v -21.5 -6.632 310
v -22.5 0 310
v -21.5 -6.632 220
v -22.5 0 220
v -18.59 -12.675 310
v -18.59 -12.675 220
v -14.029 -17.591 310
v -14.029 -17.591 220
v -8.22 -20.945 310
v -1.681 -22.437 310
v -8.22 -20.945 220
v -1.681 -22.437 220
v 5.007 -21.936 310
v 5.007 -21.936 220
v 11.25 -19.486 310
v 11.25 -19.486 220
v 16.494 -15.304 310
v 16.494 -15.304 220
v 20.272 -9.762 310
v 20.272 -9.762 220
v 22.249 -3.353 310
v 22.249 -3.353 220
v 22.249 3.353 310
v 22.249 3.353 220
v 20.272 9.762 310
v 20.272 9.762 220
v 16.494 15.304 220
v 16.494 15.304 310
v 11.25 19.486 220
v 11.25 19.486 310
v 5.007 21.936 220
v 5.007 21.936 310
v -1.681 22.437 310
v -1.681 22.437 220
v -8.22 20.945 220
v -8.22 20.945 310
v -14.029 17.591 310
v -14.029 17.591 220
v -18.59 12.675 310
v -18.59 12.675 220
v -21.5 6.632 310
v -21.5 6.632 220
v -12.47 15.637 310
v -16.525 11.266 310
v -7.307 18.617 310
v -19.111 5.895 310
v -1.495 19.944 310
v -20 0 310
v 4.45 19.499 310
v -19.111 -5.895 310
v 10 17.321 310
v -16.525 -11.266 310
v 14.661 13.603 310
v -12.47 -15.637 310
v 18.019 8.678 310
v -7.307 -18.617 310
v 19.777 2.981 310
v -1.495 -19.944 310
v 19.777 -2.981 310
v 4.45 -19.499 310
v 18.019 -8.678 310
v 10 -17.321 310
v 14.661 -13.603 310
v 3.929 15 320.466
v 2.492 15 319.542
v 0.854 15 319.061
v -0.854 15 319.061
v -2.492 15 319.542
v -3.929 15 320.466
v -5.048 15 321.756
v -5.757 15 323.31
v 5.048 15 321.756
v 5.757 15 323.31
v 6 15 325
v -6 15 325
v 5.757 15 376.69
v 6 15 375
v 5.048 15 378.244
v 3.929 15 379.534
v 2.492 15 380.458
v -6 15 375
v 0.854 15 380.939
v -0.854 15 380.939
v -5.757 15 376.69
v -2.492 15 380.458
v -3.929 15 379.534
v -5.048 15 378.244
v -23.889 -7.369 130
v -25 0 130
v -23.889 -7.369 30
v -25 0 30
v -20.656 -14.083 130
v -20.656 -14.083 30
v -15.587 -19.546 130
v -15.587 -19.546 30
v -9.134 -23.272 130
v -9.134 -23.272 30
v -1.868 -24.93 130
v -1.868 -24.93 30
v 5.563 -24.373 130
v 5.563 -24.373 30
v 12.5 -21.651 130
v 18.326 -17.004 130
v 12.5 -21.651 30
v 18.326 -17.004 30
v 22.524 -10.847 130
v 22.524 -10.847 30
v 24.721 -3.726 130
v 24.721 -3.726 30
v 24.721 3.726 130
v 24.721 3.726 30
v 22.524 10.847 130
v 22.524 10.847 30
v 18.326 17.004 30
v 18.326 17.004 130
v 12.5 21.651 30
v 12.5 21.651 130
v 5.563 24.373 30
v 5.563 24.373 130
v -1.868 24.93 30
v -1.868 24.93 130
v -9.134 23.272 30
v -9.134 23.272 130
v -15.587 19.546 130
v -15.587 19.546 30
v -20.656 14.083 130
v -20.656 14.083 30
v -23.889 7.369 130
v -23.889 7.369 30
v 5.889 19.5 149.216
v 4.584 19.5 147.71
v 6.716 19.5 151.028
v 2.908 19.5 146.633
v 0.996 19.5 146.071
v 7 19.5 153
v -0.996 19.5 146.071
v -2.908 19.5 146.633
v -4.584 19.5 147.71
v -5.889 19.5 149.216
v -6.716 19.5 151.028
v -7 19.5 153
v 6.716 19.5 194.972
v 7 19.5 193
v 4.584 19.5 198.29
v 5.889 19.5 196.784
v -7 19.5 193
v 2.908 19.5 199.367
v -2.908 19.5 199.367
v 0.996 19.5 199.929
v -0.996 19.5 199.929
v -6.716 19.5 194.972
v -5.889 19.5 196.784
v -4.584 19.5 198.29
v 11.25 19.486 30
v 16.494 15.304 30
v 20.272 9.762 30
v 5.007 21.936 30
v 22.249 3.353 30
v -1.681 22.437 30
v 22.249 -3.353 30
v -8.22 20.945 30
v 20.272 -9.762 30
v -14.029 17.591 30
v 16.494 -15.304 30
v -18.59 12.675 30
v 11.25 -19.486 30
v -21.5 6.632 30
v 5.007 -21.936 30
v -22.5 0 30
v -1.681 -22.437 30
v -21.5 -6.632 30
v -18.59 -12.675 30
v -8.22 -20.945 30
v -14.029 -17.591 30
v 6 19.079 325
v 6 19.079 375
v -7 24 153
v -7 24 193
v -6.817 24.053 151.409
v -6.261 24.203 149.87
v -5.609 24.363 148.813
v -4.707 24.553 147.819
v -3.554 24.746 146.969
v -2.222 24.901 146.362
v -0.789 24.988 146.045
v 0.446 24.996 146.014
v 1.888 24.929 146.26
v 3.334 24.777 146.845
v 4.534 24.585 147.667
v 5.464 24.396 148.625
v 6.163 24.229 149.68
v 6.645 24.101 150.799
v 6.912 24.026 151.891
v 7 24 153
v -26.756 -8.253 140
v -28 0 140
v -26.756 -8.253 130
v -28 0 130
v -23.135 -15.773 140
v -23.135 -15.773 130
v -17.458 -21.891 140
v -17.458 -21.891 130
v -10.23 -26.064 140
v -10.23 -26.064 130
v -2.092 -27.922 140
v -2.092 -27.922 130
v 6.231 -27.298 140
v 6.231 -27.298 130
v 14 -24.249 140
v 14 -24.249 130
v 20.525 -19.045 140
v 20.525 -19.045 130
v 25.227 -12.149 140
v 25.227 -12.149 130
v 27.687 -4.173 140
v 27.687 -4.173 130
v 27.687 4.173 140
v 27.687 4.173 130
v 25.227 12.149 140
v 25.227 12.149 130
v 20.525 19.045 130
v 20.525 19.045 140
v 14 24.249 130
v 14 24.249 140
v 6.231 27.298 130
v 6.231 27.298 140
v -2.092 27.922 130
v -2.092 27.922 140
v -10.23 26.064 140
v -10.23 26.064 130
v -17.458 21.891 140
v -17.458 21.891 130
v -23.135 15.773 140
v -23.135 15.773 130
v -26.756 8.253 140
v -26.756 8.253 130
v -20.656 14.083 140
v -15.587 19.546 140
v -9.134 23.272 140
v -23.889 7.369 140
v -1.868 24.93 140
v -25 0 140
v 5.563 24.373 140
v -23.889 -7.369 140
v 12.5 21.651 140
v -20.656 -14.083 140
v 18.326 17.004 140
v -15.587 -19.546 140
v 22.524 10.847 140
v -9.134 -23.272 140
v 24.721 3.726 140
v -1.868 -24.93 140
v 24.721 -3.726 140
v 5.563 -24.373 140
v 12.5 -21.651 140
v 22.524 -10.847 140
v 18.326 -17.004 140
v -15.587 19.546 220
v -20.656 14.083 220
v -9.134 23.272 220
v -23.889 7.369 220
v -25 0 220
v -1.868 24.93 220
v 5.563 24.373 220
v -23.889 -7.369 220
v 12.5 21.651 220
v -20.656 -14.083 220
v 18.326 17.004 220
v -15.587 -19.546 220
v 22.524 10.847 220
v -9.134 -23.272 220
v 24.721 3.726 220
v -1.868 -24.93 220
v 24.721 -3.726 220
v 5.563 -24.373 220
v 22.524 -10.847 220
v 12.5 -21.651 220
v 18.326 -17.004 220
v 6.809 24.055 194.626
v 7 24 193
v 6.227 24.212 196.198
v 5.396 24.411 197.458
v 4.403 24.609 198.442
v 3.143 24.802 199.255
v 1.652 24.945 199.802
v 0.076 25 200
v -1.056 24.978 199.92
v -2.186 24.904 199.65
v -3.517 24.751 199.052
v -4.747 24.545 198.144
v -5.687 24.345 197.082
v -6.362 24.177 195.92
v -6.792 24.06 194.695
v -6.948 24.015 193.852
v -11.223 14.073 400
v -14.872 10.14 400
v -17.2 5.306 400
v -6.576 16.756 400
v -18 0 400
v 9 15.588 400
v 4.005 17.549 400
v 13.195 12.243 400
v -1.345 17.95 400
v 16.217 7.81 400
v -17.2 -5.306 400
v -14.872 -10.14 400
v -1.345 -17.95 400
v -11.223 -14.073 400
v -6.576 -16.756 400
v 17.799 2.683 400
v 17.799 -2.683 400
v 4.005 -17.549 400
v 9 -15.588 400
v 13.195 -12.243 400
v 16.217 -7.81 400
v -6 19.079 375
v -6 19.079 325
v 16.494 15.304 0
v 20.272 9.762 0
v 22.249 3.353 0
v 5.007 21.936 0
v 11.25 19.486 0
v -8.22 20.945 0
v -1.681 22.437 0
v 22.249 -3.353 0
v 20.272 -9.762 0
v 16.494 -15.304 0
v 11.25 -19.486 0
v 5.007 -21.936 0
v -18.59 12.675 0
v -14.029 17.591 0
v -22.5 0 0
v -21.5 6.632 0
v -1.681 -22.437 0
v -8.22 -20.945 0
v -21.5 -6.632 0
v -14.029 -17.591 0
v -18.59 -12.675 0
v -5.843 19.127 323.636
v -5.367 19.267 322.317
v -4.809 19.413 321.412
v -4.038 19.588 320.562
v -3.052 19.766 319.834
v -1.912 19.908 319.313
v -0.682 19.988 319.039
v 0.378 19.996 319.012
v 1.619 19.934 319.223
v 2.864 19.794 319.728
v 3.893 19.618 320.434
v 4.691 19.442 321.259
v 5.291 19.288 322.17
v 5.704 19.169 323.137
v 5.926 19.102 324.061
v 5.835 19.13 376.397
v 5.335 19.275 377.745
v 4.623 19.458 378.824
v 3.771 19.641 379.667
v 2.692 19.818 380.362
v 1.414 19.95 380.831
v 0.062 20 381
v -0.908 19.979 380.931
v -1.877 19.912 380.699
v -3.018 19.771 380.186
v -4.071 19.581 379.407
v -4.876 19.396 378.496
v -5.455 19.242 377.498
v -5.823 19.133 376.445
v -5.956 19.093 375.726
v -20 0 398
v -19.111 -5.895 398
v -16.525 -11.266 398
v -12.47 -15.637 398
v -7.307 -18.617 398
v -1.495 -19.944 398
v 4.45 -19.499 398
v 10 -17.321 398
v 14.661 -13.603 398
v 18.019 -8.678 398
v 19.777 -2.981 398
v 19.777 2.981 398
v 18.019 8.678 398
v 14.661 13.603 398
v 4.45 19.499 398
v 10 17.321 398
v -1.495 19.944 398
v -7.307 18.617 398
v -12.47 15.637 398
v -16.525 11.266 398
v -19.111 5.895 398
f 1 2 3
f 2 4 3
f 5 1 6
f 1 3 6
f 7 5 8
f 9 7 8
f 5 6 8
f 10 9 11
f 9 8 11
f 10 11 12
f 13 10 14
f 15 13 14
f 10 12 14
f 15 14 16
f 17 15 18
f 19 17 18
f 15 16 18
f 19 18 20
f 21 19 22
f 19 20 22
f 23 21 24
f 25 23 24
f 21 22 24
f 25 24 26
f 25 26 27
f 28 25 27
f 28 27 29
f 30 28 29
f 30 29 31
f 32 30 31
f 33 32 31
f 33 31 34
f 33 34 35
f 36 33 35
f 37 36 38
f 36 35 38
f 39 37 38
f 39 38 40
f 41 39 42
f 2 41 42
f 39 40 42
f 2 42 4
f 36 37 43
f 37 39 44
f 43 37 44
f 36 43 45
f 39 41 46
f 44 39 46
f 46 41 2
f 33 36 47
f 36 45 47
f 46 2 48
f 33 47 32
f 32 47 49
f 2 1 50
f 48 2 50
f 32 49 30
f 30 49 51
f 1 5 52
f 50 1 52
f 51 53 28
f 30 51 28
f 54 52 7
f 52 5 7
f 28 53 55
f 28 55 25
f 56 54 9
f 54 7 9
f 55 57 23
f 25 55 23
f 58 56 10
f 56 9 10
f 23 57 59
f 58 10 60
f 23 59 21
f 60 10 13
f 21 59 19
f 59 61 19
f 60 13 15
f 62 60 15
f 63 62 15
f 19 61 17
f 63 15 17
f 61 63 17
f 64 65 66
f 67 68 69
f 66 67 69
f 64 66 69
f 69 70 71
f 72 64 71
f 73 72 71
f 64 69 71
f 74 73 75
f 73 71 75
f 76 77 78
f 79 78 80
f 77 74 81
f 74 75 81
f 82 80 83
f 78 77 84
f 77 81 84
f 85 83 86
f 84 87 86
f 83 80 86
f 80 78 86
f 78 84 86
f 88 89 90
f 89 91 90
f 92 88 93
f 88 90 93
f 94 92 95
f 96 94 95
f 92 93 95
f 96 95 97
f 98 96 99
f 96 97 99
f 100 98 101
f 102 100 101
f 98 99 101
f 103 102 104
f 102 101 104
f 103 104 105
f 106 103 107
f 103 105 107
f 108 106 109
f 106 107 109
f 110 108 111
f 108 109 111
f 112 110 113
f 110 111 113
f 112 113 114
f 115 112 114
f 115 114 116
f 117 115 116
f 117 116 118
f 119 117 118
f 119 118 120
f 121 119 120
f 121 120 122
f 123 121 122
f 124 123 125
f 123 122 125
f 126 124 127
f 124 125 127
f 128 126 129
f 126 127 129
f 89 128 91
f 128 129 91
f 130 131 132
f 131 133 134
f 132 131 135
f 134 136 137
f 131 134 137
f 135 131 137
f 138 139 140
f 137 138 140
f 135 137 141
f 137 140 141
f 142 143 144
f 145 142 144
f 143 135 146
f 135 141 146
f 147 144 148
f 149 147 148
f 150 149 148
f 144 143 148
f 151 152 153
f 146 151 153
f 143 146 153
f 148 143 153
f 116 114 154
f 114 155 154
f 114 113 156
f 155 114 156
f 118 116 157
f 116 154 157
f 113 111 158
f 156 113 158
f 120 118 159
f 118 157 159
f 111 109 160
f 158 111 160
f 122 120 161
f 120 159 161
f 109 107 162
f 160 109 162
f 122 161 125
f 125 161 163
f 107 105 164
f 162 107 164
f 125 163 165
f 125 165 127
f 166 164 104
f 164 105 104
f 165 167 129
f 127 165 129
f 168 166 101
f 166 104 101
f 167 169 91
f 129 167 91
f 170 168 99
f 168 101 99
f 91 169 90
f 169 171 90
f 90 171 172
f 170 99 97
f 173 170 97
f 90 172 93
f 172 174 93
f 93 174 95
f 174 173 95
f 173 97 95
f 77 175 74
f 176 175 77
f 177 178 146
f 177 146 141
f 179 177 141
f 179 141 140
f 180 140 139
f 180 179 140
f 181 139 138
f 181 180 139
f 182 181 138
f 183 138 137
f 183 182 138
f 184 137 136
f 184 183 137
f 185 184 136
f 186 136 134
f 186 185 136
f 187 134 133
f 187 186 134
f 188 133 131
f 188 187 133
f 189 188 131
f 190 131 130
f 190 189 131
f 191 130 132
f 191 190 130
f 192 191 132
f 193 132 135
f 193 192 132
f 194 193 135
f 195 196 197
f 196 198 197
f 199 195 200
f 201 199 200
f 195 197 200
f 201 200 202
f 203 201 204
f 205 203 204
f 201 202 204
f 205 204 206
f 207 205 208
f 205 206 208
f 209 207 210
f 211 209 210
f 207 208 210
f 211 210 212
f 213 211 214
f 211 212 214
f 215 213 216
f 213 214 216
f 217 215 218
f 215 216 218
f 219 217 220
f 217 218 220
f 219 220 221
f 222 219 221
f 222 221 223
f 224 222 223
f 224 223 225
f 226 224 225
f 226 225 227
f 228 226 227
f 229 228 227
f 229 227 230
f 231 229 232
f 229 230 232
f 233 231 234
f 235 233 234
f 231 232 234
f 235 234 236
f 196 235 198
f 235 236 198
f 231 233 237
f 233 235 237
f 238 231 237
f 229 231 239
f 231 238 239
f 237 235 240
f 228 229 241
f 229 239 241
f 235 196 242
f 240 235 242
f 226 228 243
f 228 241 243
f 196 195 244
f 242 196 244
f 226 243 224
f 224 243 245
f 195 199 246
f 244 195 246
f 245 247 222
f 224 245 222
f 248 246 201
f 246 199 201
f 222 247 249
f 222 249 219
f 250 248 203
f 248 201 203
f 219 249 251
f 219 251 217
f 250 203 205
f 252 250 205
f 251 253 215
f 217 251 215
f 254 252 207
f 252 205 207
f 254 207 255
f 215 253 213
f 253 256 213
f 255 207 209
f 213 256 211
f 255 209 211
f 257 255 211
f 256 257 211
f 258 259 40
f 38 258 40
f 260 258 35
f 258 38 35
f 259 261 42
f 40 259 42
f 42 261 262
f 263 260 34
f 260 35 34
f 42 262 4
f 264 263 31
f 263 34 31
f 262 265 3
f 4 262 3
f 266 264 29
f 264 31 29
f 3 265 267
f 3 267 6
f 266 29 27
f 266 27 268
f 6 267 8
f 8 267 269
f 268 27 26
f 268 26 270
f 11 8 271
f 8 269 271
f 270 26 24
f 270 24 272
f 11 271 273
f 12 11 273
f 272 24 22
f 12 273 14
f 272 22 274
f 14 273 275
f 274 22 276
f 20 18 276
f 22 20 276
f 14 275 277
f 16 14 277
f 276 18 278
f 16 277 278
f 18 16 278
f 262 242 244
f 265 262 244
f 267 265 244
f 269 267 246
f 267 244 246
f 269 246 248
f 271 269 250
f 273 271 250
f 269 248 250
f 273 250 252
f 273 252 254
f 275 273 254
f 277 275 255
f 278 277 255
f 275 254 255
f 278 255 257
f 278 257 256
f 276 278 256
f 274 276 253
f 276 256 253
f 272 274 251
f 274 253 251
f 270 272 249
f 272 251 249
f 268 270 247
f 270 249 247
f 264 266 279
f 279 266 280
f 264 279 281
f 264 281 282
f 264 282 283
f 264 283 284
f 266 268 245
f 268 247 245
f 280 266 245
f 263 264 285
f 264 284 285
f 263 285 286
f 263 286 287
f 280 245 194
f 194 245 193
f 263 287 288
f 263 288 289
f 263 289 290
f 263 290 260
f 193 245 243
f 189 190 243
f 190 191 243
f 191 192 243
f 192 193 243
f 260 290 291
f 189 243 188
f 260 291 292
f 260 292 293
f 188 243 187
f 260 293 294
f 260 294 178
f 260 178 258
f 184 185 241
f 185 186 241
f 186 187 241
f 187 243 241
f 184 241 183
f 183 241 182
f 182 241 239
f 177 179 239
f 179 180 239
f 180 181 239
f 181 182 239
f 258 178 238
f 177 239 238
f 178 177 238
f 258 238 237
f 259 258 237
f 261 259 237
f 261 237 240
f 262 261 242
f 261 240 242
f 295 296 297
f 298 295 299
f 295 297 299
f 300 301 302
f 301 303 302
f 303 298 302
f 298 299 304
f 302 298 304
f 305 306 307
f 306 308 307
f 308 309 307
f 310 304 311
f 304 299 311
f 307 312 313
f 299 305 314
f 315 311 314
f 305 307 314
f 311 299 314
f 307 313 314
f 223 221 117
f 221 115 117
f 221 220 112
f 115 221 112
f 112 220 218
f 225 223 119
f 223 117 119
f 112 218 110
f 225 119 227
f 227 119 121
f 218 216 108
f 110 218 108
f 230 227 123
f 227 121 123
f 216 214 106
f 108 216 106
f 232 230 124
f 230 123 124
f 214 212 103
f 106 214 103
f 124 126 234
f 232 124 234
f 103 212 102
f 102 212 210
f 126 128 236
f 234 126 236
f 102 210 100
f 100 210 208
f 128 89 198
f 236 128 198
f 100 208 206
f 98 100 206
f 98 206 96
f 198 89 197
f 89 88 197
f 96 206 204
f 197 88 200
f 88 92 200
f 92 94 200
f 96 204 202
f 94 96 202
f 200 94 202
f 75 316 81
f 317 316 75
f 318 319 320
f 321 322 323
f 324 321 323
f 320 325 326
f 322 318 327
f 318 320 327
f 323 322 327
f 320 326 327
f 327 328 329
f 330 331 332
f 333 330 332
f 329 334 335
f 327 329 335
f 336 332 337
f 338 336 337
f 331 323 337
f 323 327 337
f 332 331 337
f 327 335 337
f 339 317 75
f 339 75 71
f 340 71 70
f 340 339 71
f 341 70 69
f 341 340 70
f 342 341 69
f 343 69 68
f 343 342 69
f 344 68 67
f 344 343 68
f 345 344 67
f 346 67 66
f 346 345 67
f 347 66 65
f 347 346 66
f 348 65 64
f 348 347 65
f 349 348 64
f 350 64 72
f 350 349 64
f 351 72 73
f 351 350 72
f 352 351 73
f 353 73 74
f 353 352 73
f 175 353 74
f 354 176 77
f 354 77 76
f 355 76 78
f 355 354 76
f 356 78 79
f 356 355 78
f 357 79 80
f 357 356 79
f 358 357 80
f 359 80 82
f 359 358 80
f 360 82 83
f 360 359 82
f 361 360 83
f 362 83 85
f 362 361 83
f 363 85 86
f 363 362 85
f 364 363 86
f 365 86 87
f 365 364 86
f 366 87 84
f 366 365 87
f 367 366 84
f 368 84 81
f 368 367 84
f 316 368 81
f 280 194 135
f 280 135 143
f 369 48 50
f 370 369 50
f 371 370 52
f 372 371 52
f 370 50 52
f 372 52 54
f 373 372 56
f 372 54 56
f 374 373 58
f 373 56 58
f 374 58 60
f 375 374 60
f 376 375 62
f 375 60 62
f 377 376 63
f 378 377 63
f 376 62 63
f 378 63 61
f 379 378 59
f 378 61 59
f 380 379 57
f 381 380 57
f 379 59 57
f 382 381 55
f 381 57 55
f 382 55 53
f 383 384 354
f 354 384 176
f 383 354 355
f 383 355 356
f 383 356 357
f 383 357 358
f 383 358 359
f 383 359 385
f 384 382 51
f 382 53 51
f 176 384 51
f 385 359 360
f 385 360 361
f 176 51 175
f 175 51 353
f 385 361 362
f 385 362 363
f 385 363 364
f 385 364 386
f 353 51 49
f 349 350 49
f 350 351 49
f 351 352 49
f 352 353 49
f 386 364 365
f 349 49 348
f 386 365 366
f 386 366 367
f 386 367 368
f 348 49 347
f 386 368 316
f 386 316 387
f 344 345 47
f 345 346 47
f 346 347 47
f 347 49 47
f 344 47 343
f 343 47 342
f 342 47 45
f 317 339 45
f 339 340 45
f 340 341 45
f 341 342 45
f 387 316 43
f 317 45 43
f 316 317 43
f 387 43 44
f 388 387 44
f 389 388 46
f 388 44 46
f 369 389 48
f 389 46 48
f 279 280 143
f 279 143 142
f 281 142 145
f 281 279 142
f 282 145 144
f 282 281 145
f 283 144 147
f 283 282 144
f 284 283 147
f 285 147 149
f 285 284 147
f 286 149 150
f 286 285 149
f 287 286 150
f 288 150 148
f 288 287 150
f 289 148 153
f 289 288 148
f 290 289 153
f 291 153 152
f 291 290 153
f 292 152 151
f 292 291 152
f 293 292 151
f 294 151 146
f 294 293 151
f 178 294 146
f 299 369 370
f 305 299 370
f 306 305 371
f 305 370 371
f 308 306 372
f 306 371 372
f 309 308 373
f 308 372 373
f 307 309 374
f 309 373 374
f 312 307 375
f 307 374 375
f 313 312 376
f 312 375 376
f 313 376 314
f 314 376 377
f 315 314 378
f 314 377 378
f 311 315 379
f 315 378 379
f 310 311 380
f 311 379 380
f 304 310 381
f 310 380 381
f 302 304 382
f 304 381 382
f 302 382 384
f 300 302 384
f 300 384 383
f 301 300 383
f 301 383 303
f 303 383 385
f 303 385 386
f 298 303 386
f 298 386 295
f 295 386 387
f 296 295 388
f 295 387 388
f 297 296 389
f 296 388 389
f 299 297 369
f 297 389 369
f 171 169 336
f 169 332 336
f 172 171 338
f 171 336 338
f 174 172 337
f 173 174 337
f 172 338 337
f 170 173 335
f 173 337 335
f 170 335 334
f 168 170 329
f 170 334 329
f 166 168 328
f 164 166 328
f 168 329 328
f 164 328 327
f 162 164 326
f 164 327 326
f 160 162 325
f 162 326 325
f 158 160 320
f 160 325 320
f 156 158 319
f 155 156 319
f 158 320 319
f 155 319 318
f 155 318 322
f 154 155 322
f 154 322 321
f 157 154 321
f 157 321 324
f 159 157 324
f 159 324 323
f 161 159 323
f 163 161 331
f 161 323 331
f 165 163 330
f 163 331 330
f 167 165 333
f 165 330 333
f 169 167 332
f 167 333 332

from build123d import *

# Parameters (mm, degrees)
CUT_EXTRUDE1_DEPTH  = 5
CUT_EXTRUDE12_DEPTH = 5.5
CHAMFER1_SIZE       = 2


with BuildPart() as part:
    # Sketch1 → Revolve1 (revolve)
    with BuildSketch(Plane(origin=(0, 0, 0), x_dir=(1, 0, 0), z_dir=(0, 1, 0)), mode=Mode.PRIVATE) as revolve1_sk:
        Polygon((0, 0), (0, -400), (20, -400), (20, -310), (22.5, -310), (22.5, -220), (25, -220), (25, -140), (28, -140), (28, -130), (25, -130), (25, -30), (22.5, -30), (22.5, 0), align=None)
    revolve(revolve1_sk.sketch.rotate(Axis((0, 0, 0), (0, 0, 1)), 180), axis=Axis((0, 0, 0), (0, 0, 1)))

    # Sketch3 → Cut-Extrude1 (cut)
    with BuildSketch(Plane(origin=(0, 20, 400), x_dir=(0, 0, 1), z_dir=(0, -1, 0))):
        with BuildLine():
            Line((-25, 6), (-75, 6))
            ThreePointArc((-75, 6), (-81, 0), (-75, -6))
            Line((-75, -6), (-25, -6))
            ThreePointArc((-25, -6), (-19, 0), (-25, 6))
        make_face()
    extrude(amount=CUT_EXTRUDE1_DEPTH, mode=Mode.SUBTRACT)

    # Sketch32 → Cut-Extrude12 (cut)
    with BuildSketch(Plane(origin=(0, 25, 220), x_dir=(0, 0, 1), z_dir=(0, -1, 0))):
        with BuildLine():
            Line((-27, 7), (-67, 7))
            ThreePointArc((-67, 7), (-74, 0), (-67, -7))
            Line((-67, -7), (-27, -7))
            ThreePointArc((-27, -7), (-20, 0), (-27, 7))
        make_face()
    extrude(amount=CUT_EXTRUDE12_DEPTH, mode=Mode.SUBTRACT)

    # Chamfer1
    chamfer1_edges = [part.edges().sort_by_distance(p)[0] for p in [
        (20, 0, 400),
    ]]
    chamfer(chamfer1_edges, length=CHAMFER1_SIZE)


solid = part.part
